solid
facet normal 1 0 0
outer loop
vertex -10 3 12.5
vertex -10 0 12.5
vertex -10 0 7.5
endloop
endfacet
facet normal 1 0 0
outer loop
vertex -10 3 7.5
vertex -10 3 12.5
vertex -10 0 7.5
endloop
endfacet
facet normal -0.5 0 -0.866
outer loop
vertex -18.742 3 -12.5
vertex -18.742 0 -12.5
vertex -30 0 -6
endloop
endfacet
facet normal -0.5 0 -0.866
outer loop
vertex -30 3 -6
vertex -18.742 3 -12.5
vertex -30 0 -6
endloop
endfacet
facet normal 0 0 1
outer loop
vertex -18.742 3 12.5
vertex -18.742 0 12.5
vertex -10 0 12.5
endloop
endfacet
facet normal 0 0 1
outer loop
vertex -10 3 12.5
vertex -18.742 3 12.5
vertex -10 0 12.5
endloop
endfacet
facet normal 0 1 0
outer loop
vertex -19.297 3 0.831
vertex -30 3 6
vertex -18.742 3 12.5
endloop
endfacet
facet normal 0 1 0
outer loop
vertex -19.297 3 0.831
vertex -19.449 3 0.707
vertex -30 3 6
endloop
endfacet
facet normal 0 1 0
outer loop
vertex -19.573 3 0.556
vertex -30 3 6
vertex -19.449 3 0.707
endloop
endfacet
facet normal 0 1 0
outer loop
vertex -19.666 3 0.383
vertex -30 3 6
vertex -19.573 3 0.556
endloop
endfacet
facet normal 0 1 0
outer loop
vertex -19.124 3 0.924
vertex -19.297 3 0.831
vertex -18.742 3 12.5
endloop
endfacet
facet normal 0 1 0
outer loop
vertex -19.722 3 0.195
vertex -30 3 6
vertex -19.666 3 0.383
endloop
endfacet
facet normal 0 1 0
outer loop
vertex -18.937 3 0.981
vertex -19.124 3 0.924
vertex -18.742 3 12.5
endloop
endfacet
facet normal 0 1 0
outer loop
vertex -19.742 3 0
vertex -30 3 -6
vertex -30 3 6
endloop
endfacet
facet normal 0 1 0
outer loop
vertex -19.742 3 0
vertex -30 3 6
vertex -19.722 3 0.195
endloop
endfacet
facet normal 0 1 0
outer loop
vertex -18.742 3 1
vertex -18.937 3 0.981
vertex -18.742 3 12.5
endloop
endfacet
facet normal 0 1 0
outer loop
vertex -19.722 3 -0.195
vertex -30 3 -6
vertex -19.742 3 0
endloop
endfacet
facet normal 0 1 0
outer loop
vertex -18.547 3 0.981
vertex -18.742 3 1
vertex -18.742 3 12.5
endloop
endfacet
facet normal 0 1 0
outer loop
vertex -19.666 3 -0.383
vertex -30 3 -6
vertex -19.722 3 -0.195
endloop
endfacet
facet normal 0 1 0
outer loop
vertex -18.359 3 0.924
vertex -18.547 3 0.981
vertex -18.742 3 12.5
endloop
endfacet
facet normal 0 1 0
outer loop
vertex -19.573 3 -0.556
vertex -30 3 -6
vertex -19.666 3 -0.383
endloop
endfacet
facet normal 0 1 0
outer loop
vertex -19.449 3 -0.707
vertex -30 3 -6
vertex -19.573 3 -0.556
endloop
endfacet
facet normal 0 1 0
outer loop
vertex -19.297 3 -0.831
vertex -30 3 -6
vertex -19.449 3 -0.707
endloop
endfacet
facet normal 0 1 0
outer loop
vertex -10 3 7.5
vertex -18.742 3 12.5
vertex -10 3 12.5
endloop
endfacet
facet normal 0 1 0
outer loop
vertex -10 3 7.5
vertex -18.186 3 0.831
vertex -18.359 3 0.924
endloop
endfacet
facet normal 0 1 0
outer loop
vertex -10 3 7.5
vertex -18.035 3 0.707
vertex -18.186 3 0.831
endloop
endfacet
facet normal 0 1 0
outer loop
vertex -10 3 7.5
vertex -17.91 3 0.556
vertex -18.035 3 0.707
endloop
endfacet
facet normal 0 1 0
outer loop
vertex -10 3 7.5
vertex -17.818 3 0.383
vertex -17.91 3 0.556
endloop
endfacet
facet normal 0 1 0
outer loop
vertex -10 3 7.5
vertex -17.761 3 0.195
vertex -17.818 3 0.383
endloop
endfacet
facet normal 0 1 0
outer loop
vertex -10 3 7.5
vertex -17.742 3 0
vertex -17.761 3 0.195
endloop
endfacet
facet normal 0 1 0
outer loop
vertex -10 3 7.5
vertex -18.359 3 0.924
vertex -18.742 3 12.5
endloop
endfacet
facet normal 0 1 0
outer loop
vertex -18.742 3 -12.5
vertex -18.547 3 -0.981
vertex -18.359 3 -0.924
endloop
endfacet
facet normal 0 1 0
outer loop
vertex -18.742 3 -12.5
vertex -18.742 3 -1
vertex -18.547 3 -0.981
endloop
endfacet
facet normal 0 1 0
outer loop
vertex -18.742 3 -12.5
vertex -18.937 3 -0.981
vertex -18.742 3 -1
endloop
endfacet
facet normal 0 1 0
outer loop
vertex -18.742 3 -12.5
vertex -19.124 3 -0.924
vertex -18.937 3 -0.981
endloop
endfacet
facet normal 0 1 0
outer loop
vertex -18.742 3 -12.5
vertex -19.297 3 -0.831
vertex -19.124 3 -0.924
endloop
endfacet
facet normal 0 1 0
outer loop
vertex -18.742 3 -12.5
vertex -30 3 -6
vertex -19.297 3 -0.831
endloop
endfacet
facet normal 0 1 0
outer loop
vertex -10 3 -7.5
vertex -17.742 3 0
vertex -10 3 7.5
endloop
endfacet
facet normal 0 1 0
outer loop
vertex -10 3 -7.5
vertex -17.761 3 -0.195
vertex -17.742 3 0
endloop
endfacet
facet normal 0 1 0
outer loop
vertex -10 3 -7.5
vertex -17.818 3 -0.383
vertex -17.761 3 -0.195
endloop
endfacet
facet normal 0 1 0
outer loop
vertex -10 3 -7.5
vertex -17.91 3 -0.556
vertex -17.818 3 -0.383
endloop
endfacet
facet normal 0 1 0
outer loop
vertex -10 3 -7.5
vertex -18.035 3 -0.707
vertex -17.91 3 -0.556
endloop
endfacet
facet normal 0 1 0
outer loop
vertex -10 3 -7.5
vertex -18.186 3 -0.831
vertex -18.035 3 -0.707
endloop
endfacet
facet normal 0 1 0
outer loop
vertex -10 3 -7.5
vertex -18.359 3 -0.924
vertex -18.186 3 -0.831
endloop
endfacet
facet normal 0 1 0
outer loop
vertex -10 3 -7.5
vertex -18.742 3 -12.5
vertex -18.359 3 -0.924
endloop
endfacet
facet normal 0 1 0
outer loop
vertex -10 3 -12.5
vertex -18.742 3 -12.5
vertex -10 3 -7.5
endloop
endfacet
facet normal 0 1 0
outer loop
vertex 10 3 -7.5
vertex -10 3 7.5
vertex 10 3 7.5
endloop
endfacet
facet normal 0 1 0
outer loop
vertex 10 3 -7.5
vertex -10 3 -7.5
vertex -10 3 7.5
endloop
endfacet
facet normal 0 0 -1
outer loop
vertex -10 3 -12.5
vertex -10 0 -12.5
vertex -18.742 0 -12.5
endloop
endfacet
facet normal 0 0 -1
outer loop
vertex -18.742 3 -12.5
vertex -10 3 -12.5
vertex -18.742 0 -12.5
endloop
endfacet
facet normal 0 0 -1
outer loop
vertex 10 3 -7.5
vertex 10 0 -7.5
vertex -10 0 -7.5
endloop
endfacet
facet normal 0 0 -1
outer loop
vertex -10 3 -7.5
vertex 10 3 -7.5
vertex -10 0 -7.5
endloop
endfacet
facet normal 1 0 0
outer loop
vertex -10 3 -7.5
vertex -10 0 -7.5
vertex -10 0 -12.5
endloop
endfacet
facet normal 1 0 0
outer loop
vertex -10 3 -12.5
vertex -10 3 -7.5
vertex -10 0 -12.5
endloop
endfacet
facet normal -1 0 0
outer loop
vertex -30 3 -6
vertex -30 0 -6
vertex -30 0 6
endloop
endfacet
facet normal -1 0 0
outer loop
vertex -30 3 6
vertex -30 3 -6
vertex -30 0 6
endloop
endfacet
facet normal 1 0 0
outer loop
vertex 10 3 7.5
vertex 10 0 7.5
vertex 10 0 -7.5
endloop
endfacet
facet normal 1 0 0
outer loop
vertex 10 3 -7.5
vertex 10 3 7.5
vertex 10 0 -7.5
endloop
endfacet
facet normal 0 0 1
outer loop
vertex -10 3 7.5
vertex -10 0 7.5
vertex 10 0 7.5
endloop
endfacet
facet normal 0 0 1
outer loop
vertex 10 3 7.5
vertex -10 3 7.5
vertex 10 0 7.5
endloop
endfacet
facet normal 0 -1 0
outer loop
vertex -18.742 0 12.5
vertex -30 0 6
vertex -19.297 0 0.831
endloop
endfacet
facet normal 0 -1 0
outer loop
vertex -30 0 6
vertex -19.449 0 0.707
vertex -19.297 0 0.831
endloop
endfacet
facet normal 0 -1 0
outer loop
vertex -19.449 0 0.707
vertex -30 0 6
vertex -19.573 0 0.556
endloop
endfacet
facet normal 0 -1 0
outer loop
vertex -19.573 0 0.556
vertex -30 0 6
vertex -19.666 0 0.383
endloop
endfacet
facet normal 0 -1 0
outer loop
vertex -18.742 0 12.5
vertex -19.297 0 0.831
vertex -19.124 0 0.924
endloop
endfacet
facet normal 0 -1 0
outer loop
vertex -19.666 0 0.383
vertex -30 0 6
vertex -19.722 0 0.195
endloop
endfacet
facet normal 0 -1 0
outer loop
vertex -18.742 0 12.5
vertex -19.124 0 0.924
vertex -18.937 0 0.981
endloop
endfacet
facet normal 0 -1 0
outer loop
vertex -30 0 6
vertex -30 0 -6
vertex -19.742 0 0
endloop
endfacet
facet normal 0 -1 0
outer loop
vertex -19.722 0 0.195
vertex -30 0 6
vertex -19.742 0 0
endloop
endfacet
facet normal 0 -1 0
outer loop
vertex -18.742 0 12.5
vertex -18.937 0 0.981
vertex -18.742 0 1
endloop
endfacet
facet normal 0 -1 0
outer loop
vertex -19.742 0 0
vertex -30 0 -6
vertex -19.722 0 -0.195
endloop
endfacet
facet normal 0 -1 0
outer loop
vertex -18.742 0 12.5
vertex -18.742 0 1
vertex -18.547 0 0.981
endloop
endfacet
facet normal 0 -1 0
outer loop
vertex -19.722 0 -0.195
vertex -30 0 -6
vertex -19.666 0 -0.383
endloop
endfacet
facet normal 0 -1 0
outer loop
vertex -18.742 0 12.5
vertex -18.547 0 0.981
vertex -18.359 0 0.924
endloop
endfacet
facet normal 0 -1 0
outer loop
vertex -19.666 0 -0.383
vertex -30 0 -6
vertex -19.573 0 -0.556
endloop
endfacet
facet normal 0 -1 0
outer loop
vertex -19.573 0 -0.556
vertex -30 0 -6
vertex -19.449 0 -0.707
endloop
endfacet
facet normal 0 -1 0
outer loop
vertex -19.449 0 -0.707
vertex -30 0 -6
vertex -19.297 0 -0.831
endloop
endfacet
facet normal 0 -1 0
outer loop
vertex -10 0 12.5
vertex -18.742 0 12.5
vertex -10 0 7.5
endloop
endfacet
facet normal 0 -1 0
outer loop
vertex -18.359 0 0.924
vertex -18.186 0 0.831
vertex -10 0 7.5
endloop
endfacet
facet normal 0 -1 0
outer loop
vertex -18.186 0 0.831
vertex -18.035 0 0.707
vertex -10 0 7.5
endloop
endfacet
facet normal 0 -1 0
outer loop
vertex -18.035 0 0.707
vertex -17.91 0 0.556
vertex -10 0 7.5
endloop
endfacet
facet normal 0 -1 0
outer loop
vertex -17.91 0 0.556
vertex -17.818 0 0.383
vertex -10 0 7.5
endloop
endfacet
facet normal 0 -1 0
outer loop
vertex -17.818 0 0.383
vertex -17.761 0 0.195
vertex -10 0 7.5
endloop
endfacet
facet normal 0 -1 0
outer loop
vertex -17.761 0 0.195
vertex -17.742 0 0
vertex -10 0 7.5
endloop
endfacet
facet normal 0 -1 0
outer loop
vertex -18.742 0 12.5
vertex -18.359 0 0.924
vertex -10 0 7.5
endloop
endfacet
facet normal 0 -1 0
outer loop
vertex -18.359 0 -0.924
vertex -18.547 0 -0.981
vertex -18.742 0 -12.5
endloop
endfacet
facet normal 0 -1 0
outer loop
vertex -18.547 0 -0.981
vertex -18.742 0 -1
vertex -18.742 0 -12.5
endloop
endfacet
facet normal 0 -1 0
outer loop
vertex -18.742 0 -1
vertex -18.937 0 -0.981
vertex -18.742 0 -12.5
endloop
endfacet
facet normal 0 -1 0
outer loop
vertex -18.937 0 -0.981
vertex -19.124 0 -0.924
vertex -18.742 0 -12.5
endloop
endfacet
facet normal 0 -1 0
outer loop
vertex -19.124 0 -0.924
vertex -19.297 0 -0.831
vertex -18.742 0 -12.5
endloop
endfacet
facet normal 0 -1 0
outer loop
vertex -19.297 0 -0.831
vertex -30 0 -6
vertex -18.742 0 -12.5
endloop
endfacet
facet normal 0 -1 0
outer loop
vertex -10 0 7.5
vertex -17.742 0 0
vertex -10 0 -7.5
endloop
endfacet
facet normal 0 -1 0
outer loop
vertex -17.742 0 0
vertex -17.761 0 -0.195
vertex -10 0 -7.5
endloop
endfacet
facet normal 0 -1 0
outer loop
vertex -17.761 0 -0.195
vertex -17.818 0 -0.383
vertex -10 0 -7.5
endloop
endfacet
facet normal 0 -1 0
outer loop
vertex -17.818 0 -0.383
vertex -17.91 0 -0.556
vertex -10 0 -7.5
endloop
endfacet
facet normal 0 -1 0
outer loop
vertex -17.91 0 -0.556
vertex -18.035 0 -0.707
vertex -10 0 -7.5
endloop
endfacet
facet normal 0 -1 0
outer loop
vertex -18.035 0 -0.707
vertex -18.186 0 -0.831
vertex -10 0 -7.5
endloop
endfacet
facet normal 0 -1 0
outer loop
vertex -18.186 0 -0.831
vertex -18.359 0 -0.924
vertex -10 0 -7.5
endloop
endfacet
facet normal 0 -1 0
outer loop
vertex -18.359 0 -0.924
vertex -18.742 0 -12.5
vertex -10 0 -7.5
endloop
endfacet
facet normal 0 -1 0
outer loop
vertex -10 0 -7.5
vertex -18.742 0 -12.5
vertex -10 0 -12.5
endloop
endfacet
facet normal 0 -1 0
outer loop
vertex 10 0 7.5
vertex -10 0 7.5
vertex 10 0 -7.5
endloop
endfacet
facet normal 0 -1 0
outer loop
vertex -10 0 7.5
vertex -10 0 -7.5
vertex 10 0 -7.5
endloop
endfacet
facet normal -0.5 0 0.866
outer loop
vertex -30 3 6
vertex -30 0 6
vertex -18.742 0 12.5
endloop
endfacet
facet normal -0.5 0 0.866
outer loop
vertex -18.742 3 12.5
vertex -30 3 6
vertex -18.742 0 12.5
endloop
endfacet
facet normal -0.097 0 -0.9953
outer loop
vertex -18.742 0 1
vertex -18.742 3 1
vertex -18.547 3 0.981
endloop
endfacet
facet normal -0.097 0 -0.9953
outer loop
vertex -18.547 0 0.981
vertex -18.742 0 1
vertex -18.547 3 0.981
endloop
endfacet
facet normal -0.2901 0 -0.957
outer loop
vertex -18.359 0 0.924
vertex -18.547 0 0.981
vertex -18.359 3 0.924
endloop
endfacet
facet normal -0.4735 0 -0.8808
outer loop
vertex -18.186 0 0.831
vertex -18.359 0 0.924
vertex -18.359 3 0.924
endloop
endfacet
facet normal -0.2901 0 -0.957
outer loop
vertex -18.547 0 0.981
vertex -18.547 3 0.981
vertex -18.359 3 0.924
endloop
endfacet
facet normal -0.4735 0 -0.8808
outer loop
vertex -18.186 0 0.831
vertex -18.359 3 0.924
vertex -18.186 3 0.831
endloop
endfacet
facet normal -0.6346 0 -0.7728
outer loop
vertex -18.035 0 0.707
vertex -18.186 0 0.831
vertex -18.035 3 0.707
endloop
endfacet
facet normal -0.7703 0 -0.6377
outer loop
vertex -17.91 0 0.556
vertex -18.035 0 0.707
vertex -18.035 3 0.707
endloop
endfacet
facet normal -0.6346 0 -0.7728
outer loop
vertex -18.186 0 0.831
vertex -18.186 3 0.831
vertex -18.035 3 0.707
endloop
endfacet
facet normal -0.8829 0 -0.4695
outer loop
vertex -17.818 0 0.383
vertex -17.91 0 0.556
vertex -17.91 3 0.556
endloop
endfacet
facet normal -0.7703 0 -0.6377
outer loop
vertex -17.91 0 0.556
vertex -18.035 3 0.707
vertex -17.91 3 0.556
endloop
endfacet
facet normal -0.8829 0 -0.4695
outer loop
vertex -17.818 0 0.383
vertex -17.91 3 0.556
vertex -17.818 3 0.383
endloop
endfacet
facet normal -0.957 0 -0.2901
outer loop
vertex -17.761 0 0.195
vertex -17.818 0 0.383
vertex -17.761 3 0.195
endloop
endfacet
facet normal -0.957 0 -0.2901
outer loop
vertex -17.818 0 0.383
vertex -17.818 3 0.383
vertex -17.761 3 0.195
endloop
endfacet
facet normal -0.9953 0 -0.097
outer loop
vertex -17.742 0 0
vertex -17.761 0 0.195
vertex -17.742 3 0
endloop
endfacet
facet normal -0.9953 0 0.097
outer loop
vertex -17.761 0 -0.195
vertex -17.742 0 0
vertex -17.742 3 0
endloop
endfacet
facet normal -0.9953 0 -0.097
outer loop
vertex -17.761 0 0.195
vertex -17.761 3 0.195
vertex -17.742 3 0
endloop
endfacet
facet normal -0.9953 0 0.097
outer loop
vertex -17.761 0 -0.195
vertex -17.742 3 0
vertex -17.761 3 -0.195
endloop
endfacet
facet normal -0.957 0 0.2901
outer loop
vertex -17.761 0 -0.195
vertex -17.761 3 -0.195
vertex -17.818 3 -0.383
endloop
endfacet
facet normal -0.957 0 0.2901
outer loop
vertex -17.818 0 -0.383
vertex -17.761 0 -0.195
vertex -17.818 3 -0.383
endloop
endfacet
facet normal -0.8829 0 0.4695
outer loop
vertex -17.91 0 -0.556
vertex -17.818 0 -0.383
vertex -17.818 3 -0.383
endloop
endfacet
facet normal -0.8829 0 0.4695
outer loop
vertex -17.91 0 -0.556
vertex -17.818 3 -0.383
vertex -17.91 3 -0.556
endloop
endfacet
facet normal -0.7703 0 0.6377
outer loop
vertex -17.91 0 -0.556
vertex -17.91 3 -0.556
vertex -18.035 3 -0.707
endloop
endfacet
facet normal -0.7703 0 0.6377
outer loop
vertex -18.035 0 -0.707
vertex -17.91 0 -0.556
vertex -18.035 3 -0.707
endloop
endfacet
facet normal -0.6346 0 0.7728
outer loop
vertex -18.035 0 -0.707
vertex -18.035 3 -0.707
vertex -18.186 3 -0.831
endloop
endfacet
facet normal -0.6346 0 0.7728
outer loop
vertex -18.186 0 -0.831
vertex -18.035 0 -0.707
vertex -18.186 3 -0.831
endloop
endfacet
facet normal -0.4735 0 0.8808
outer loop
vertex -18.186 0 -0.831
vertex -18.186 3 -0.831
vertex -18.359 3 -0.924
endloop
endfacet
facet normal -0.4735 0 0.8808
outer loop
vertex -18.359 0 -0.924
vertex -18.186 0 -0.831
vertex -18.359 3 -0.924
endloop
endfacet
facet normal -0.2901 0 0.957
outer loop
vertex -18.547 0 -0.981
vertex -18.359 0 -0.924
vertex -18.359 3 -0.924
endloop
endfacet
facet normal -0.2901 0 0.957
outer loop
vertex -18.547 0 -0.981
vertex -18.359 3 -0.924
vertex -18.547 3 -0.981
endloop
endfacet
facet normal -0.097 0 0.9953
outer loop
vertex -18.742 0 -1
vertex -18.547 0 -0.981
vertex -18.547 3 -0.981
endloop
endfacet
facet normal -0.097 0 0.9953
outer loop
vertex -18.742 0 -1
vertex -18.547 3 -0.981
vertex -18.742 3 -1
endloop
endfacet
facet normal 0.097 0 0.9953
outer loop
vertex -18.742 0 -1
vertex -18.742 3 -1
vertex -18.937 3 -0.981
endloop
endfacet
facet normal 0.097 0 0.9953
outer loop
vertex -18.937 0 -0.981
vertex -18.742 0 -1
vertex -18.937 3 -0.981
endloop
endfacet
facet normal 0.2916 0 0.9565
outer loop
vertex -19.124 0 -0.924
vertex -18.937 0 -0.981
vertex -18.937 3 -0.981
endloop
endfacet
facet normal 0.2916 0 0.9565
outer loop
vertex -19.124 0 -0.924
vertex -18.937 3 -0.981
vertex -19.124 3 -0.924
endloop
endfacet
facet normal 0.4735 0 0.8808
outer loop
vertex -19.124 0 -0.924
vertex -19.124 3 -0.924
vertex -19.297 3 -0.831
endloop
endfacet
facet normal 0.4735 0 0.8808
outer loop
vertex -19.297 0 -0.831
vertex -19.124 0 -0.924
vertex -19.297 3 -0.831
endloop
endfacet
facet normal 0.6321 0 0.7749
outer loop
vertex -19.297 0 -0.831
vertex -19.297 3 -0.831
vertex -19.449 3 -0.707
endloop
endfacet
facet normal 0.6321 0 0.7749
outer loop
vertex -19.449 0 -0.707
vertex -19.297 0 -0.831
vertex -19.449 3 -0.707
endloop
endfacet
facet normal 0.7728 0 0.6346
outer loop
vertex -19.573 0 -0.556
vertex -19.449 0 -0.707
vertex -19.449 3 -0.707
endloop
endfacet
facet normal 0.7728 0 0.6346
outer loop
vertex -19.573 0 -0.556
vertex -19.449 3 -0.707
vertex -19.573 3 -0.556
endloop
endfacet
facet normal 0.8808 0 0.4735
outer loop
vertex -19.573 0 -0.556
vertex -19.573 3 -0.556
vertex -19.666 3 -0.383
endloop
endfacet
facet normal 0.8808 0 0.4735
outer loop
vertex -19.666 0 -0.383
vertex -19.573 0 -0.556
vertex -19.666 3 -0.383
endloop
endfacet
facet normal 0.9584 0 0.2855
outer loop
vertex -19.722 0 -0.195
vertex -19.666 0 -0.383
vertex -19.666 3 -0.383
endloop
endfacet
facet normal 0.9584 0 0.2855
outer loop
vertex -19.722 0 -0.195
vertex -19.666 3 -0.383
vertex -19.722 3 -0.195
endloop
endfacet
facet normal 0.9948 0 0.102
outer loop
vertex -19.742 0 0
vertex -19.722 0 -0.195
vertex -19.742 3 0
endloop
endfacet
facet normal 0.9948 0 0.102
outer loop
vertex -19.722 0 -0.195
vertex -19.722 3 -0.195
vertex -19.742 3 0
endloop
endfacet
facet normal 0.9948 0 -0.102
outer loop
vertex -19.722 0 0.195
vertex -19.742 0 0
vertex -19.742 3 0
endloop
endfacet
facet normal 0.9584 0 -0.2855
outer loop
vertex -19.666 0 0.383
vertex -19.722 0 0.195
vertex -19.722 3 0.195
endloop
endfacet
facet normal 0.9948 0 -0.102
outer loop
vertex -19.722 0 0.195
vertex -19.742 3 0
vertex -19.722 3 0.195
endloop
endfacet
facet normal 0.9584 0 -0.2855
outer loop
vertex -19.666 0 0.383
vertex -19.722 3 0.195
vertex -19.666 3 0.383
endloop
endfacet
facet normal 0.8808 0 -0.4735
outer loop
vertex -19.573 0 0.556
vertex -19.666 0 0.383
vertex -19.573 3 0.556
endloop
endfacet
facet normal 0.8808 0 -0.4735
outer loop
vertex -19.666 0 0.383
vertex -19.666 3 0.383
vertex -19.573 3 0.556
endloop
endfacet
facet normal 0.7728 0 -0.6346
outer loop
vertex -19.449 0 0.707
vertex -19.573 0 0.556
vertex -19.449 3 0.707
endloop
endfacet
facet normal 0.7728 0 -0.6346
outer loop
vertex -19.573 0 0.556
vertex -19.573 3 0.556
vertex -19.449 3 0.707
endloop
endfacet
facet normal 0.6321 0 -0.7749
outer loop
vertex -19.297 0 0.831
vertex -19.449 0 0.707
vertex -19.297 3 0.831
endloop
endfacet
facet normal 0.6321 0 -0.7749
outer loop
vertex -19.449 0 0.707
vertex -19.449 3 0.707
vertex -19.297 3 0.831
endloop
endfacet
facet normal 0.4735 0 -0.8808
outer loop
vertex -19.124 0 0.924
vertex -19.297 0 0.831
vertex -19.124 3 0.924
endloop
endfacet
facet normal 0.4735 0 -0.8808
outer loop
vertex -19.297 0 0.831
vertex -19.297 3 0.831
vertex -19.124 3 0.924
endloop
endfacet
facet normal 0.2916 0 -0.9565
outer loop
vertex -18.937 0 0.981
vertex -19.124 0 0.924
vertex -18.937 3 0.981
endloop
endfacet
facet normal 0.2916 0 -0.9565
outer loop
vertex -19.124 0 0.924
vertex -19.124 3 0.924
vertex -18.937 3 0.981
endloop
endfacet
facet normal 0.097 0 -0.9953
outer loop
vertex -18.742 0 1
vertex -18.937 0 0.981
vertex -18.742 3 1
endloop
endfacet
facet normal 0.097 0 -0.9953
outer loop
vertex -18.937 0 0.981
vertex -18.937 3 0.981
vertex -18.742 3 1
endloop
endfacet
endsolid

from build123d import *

# Parameters (mm, degrees)
BOSS_EXTRUDE1_DEPTH = 3
SKETCH2_R           = 1
CUT_EXTRUDE1_DEPTH  = 33


with BuildPart() as part:
    # Sketch1 → Boss-Extrude1 (new body)
    with BuildSketch(Plane(origin=(0, 0, 0), x_dir=(1, 0, 0), z_dir=(0, 1, 0))):
        Polygon((-10, 7.5), (-10, 12.5), (-18.741669751, 12.5), (-30, 6), (-30, -6), (-18.741669751, -12.5), (-10, -12.5), (-10, -7.5), (10, -7.5), (10, 7.5), align=None)
    extrude(amount=BOSS_EXTRUDE1_DEPTH)

    # Sketch2 → Cut-Extrude1 (cut)
    with BuildSketch(Plane(origin=(0, 3, 0), x_dir=(1, 0, 0), z_dir=(0, 1, 0))):
        with Locations(Location((-18.741669751, 0, 0), (0, 0, 270))):
            Circle(SKETCH2_R)
    extrude(amount=-CUT_EXTRUDE1_DEPTH, mode=Mode.SUBTRACT)


solid = part.part
